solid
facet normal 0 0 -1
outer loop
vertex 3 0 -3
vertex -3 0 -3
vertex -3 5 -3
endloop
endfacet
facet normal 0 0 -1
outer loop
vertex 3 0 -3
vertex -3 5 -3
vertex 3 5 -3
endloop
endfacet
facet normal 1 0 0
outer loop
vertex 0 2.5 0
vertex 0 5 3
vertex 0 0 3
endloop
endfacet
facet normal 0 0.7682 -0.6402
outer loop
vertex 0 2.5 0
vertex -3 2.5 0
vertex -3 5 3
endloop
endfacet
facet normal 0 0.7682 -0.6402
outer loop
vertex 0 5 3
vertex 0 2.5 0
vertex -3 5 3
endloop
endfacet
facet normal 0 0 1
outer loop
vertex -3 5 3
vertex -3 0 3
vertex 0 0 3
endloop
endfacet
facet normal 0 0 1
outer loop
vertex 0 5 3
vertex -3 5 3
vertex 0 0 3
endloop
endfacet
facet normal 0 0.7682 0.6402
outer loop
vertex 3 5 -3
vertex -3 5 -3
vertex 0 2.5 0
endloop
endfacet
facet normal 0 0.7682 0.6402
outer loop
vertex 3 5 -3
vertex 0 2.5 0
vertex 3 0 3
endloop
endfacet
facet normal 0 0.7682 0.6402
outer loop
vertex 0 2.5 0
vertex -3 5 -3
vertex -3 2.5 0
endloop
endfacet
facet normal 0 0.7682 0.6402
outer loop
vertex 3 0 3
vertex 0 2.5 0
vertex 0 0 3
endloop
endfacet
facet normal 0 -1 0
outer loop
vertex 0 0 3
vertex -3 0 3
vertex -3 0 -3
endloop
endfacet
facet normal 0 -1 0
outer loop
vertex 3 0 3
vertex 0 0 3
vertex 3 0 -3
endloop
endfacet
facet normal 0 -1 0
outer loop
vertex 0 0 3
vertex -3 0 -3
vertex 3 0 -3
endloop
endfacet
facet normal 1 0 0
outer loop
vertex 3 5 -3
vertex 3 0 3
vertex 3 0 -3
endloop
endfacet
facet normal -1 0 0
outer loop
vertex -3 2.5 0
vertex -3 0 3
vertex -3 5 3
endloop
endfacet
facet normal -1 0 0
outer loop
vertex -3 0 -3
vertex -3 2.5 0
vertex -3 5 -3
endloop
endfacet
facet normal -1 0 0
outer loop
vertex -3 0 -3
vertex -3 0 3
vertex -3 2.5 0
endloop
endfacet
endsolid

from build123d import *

# Parameters (mm, degrees)
SKETCH1_W           = 6
SKETCH1_H           = 6
BOSS_EXTRUDE1_DEPTH = 5
CUT_EXTRUDE1_DEPTH  = 10
CUT_EXTRUDE2_DEPTH  = 3


with BuildPart() as part:
    # Sketch1 → Boss-Extrude1 (new body)
    with BuildSketch(Plane(origin=(0, 0, 0), x_dir=(1, 0, 0), z_dir=(0, 1, 0))):
        Rectangle(SKETCH1_W, SKETCH1_H)
    extrude(amount=BOSS_EXTRUDE1_DEPTH)

    # Sketch2 → Cut-Extrude1 (cut)
    with BuildSketch(Plane.ZY.offset(3)):
        Polygon((3, 5), (-3, 5), (0, 2.5), align=None)
    extrude(amount=-CUT_EXTRUDE1_DEPTH, mode=Mode.SUBTRACT)

    # Sketch3 → Cut-Extrude2 (cut)
    with BuildSketch(Plane(origin=(3, 0, 0), x_dir=(0, 0, -1), z_dir=(1, 0, 0))):
        Polygon((-3, 0), (0, 2.5), (-3, 5), align=None)
    extrude(amount=-CUT_EXTRUDE2_DEPTH, mode=Mode.SUBTRACT)


solid = part.part
